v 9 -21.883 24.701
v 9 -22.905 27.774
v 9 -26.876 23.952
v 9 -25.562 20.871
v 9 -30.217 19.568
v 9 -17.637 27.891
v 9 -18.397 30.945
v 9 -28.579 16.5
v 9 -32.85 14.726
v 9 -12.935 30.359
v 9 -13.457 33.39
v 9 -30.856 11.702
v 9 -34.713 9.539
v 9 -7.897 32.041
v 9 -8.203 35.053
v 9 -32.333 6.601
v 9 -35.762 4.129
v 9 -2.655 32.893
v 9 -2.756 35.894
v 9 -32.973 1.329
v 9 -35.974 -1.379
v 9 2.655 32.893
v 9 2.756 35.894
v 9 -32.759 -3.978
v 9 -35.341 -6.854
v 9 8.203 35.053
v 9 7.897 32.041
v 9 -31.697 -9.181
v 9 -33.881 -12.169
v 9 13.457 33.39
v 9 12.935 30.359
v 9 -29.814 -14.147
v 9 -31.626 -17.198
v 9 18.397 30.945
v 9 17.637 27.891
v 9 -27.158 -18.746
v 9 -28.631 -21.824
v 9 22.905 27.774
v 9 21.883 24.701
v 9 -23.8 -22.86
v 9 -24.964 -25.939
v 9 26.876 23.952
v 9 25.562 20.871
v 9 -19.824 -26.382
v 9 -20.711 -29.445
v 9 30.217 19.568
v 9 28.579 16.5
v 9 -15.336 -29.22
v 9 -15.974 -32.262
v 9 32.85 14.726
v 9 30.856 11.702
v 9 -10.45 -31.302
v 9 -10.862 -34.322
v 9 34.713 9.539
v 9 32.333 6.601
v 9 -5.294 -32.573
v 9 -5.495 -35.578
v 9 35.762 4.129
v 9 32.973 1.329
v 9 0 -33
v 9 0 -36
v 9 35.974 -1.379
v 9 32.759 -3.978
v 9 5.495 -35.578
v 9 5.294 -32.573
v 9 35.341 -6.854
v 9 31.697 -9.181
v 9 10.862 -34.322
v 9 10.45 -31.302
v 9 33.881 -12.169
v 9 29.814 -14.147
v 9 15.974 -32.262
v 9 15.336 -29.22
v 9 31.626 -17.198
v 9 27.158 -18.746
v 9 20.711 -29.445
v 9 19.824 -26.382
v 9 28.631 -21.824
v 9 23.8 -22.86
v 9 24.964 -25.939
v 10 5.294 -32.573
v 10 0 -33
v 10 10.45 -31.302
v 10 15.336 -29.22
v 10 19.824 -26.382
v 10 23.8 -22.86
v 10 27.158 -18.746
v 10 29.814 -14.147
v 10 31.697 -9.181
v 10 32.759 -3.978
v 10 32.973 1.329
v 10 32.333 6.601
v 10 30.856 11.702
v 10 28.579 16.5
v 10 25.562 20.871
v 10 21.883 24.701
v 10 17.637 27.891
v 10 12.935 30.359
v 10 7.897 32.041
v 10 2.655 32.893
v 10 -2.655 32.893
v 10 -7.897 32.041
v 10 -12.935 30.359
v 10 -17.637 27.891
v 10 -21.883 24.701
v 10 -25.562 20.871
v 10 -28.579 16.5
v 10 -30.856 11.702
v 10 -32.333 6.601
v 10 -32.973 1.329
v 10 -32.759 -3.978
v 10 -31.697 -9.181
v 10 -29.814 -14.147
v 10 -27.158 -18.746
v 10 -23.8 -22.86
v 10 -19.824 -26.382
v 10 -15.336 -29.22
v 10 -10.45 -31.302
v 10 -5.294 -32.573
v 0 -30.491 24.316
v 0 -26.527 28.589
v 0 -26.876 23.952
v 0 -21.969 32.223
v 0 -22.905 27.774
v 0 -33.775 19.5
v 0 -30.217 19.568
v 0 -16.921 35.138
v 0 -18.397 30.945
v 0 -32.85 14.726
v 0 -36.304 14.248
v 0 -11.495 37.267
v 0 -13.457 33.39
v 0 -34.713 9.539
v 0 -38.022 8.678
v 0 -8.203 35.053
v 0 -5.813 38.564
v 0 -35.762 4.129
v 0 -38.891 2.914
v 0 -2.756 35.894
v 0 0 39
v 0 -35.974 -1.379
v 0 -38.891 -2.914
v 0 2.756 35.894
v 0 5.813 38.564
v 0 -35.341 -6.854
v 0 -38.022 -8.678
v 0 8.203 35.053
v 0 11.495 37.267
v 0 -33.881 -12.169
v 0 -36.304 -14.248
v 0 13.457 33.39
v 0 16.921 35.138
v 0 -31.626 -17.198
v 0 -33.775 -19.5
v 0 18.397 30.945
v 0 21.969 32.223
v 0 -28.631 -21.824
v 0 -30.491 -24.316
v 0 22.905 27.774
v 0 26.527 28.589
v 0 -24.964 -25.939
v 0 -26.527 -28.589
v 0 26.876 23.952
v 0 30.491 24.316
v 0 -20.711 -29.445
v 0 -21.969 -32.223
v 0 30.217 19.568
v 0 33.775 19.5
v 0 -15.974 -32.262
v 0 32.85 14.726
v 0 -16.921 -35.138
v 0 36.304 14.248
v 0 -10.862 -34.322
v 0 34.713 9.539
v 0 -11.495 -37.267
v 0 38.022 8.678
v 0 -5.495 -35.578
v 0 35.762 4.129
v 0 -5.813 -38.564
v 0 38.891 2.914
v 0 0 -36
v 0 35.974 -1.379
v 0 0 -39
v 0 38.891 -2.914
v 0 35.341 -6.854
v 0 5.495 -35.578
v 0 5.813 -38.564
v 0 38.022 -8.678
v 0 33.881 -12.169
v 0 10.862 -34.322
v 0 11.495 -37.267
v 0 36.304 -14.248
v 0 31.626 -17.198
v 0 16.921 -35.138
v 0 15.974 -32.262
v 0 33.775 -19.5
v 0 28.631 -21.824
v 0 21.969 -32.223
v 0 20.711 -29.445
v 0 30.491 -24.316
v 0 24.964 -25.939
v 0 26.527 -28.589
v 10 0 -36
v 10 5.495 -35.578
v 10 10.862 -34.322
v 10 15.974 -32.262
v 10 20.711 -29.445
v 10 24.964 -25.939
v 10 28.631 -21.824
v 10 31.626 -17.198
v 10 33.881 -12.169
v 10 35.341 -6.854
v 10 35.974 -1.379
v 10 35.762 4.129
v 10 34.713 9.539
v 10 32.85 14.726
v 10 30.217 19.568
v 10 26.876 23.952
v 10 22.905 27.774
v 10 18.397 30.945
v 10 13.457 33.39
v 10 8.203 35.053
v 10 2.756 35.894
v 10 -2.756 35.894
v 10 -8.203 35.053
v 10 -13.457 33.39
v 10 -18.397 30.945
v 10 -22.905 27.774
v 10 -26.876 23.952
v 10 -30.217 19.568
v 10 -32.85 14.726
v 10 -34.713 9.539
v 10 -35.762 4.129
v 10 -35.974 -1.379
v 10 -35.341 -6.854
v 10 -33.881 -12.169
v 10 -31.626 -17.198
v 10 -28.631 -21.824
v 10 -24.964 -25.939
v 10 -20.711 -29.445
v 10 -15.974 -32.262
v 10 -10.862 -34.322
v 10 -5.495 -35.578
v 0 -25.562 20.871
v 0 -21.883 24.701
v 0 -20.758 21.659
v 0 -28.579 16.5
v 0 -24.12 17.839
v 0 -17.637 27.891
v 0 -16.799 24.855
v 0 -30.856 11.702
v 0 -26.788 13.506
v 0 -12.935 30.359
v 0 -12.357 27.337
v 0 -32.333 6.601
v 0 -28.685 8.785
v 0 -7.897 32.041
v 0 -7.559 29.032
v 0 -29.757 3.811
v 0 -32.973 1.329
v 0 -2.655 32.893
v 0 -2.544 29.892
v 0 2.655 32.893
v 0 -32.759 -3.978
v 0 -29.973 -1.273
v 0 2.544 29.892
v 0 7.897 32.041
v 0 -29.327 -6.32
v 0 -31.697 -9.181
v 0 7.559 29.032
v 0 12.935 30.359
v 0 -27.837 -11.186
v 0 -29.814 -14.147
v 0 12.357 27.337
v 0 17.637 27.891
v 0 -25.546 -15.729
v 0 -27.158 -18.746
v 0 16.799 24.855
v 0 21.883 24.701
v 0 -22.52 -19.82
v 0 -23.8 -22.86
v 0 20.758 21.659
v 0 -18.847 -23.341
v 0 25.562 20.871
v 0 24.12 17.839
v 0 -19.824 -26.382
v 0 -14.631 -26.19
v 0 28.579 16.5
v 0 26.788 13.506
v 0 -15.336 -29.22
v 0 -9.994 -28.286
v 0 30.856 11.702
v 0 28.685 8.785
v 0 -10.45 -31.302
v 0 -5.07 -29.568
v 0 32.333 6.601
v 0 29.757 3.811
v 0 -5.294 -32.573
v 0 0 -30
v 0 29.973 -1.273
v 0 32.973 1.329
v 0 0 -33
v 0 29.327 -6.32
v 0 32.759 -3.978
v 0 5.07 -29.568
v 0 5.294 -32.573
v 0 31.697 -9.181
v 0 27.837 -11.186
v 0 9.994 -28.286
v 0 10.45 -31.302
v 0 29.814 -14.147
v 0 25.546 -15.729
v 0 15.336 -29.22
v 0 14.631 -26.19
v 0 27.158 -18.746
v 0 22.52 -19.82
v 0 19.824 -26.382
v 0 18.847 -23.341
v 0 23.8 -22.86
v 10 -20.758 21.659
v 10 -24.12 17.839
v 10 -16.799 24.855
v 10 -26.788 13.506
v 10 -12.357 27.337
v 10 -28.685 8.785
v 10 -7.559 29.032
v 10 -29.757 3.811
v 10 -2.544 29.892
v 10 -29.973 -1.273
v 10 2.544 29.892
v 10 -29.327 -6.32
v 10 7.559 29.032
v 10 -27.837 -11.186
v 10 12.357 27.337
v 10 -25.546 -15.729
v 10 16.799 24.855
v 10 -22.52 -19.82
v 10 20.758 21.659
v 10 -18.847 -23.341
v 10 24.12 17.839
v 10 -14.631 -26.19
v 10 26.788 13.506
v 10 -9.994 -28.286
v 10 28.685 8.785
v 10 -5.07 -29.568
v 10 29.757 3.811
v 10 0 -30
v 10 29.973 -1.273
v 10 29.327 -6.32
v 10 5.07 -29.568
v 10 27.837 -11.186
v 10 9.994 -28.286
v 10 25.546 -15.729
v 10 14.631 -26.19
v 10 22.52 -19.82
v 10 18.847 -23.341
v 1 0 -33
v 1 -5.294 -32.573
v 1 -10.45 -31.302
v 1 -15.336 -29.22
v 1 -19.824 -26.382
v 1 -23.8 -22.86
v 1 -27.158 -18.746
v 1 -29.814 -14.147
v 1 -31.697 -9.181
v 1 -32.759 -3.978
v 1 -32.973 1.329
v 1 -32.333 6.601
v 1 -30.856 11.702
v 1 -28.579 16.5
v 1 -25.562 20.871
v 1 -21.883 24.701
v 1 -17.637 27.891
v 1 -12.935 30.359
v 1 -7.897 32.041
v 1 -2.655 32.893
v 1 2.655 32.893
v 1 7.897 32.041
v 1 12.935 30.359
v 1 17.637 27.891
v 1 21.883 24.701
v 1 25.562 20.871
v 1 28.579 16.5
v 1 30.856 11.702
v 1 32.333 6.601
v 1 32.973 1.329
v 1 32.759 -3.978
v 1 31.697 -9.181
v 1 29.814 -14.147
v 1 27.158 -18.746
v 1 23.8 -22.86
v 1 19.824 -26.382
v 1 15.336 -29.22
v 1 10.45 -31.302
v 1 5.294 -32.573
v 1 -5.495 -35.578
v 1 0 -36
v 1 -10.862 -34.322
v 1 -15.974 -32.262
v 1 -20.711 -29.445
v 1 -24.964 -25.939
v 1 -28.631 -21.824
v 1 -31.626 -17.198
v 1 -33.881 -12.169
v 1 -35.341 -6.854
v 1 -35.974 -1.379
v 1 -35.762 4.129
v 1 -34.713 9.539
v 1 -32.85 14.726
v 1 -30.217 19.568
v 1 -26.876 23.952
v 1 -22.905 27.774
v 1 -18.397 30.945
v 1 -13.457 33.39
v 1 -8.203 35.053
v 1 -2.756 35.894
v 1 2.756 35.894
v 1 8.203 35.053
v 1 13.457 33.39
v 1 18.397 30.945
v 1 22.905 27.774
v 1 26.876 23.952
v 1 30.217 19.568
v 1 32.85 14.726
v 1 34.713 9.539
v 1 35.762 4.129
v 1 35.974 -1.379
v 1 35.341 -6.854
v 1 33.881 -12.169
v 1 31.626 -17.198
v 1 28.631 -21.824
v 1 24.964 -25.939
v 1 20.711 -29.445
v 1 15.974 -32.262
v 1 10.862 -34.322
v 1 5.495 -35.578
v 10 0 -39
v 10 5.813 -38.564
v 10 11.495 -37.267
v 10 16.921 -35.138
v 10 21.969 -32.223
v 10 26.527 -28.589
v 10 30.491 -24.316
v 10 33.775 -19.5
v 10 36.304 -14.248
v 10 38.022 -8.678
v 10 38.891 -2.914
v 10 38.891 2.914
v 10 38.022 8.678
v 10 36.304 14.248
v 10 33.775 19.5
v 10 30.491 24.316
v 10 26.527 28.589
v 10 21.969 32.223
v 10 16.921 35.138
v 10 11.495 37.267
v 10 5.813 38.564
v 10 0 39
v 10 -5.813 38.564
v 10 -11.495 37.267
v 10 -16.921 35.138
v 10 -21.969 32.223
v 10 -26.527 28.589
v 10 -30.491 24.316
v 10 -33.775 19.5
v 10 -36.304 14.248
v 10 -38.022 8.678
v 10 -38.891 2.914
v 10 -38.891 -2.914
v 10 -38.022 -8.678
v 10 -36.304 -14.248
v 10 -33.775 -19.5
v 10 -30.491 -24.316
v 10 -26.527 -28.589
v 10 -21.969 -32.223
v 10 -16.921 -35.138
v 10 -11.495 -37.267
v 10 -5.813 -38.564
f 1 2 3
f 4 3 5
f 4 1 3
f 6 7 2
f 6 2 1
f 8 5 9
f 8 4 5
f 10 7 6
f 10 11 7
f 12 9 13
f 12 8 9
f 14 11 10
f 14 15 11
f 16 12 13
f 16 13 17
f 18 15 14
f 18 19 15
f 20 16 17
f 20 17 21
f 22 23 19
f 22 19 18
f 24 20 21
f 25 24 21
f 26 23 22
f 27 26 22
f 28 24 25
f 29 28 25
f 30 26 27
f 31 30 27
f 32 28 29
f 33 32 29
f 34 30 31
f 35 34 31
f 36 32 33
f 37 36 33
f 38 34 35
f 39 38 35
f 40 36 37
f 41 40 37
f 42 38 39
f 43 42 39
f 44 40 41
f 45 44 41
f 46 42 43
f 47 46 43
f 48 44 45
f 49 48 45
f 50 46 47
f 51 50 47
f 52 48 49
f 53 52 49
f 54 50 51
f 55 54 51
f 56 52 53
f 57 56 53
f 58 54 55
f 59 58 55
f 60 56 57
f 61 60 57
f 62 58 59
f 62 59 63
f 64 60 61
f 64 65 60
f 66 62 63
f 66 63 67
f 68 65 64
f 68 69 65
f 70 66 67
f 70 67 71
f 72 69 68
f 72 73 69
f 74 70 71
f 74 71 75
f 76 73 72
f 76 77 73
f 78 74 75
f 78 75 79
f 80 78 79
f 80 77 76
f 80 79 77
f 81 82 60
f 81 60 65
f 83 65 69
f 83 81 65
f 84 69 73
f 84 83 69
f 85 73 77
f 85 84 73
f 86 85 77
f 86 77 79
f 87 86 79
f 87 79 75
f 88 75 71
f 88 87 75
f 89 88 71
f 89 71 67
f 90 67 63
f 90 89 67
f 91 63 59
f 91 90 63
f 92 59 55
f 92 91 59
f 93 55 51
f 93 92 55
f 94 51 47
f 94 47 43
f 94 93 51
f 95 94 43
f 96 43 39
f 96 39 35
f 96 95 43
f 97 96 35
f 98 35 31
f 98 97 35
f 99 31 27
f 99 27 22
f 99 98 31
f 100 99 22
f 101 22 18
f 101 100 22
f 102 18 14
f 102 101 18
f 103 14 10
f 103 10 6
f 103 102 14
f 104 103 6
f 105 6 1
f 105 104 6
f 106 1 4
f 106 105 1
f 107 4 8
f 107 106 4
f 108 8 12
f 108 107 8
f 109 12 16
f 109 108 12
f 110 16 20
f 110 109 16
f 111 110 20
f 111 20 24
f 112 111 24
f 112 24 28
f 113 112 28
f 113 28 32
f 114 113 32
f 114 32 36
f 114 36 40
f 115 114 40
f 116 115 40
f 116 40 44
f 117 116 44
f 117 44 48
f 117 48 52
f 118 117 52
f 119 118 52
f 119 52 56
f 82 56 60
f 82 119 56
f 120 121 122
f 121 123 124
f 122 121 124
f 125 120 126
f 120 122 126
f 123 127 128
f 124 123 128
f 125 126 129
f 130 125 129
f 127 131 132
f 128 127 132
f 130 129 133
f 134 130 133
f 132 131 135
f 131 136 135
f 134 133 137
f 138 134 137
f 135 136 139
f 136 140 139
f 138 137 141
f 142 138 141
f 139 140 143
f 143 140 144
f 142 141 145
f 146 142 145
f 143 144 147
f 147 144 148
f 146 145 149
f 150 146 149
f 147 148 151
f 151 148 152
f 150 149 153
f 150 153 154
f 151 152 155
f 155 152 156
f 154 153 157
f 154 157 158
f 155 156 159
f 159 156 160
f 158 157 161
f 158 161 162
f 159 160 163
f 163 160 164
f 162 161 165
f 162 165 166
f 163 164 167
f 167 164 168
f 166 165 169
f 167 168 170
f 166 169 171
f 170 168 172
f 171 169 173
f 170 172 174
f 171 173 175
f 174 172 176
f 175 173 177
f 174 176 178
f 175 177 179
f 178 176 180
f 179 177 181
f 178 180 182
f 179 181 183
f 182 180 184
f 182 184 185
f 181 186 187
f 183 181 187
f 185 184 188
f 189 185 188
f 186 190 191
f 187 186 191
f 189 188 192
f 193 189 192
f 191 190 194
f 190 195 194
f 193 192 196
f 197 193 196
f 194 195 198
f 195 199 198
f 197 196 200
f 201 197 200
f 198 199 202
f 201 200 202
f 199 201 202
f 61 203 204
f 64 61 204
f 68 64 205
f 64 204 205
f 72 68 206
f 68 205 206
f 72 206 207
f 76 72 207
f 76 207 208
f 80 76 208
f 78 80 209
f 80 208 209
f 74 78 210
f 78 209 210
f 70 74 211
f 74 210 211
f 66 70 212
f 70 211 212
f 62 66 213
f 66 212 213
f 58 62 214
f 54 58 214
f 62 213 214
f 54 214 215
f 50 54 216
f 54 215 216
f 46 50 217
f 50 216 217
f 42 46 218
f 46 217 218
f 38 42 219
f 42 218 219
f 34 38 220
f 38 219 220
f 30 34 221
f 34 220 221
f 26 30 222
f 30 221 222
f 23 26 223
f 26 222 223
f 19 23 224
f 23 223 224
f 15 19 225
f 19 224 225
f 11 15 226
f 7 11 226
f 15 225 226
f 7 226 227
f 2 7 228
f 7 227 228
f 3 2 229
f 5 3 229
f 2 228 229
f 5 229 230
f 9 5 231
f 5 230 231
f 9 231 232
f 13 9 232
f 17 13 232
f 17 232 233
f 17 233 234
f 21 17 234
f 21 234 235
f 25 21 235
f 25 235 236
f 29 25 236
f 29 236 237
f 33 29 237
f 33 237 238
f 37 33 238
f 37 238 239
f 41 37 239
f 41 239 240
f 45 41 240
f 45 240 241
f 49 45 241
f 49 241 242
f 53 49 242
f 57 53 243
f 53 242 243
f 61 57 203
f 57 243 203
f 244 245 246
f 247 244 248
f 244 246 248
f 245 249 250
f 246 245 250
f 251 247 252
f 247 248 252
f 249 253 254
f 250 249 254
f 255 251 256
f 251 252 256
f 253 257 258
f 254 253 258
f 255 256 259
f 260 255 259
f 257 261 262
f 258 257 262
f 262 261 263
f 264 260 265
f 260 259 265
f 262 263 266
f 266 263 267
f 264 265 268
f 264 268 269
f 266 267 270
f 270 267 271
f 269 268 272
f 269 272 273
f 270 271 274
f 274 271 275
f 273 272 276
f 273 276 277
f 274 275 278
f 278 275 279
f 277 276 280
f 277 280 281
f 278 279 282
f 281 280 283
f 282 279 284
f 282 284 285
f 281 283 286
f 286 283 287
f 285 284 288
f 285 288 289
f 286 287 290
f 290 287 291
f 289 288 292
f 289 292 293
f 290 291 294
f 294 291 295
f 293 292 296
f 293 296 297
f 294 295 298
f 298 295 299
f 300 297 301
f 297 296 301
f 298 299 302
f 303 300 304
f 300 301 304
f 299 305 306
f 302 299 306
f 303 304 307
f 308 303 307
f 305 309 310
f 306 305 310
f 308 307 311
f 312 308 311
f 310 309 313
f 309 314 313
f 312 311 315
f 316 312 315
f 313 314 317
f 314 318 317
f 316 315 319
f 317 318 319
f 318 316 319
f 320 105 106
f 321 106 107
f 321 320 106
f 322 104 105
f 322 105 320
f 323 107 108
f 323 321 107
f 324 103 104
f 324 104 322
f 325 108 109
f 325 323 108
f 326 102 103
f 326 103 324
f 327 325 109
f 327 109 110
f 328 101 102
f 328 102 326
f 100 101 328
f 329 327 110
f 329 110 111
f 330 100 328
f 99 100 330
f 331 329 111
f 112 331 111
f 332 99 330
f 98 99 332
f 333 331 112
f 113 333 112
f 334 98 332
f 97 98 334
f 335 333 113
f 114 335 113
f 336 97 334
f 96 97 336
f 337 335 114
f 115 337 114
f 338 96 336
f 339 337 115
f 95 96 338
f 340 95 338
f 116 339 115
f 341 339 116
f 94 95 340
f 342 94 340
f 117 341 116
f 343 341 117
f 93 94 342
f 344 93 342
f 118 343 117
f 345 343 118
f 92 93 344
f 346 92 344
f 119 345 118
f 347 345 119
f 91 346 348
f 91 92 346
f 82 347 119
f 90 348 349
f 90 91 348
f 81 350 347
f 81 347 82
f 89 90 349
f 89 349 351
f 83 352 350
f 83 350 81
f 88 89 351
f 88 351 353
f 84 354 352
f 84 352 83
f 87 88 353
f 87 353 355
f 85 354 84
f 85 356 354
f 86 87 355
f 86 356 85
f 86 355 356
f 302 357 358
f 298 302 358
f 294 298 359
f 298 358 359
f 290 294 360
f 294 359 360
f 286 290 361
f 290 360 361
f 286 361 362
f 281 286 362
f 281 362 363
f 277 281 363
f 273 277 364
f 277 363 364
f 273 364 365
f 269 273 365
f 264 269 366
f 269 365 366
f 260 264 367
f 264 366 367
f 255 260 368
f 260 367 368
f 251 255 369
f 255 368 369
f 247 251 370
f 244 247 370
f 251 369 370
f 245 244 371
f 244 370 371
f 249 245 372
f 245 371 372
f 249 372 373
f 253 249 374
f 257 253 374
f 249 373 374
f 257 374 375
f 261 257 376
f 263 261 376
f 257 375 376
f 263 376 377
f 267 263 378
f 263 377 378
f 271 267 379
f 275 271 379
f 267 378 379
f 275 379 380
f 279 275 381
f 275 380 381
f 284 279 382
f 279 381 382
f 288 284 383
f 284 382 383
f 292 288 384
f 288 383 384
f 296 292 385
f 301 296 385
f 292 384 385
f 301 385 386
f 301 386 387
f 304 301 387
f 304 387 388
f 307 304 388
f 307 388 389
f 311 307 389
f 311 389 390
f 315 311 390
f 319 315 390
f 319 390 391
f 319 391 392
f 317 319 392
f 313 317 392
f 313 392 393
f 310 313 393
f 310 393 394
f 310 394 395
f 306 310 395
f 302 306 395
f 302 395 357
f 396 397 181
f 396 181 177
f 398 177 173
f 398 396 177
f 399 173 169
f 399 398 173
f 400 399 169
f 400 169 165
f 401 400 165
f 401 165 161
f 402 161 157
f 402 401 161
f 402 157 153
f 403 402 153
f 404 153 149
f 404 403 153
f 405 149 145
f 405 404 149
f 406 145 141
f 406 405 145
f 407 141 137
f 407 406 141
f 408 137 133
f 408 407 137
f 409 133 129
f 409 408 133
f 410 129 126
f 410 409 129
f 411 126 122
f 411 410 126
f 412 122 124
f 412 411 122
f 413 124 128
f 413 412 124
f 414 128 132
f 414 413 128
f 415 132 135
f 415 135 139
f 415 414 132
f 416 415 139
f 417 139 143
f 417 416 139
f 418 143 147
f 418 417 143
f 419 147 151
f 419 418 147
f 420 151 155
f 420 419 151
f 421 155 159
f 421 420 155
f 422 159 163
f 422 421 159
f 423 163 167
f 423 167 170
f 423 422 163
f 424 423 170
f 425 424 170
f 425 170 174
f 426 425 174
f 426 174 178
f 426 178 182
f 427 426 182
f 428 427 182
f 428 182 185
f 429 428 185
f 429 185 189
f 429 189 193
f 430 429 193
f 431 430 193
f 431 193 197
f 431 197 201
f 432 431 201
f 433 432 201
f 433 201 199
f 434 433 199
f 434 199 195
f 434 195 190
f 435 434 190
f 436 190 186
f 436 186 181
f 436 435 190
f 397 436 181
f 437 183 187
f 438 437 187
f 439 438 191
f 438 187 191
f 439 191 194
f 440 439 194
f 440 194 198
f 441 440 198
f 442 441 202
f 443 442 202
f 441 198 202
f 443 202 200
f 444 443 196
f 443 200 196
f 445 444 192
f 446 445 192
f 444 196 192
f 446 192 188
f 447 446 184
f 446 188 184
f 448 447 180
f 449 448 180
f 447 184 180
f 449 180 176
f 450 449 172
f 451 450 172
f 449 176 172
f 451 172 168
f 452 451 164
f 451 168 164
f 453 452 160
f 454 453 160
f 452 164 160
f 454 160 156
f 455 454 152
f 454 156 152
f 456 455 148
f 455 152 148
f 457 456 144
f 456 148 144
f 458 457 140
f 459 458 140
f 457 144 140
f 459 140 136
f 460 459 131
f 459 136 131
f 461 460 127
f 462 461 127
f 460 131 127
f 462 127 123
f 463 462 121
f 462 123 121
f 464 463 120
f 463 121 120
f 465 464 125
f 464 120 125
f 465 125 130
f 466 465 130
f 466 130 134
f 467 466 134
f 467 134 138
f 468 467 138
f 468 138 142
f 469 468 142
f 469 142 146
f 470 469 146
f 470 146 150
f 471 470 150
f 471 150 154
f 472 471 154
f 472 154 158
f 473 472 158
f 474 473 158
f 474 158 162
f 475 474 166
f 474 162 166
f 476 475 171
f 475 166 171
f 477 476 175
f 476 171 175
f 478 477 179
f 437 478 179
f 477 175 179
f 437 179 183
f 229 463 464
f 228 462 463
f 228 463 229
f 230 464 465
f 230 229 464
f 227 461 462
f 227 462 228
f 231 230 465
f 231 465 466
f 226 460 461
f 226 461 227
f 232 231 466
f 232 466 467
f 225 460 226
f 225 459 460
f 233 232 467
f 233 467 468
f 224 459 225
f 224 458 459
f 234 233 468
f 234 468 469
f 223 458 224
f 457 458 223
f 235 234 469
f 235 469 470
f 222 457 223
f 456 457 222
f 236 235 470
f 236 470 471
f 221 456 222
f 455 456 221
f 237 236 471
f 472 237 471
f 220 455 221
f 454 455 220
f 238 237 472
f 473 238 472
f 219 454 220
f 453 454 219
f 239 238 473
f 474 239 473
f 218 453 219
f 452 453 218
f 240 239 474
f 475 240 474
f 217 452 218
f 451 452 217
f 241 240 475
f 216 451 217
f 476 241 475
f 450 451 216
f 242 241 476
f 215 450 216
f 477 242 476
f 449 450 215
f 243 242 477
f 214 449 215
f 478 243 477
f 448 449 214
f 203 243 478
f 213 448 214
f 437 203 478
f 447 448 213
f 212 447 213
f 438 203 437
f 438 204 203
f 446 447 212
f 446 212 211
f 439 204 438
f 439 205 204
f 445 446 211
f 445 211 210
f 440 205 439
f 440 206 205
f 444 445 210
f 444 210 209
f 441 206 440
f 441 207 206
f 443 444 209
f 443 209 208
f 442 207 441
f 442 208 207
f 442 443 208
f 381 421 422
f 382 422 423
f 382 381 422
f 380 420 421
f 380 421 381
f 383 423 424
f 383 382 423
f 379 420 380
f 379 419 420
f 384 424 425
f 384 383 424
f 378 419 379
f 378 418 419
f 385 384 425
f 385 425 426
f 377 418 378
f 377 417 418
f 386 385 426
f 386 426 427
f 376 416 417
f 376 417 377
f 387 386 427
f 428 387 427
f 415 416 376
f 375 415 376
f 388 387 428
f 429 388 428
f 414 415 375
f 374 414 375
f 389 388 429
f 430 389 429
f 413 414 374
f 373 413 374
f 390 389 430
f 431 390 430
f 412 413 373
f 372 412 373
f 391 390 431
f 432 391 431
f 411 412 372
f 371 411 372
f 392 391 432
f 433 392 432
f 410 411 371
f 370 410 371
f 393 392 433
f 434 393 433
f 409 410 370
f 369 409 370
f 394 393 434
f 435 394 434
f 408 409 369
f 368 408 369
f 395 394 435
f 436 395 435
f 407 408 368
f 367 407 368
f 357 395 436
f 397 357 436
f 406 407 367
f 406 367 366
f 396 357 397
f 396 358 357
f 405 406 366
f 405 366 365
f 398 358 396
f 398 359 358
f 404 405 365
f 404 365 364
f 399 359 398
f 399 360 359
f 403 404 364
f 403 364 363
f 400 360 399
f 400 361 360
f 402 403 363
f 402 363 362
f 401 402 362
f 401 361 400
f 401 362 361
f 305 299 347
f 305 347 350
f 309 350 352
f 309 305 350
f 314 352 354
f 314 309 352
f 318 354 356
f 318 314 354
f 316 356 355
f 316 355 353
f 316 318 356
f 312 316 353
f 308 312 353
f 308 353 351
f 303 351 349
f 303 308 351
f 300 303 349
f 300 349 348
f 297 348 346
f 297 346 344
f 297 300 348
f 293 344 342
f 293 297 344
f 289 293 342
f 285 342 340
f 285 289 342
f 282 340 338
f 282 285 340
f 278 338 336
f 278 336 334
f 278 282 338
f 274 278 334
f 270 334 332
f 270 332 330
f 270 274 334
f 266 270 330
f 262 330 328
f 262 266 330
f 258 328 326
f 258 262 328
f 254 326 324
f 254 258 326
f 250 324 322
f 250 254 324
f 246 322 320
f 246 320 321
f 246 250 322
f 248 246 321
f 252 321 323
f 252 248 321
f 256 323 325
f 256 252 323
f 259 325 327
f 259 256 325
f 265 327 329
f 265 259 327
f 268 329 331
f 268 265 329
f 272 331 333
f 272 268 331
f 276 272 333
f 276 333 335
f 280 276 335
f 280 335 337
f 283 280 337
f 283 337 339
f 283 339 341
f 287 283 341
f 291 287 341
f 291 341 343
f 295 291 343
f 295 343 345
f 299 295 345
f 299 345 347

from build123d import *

# Parameters (mm, degrees)
SKETCH_1_R          = 39
SKETCH_1_R_2        = 30
EXTRUDE_1_DEPTH     = 10
SKETCH_2_R          = 36
SKETCH_2_R_2        = 33
CUT_EXTRUDE_1_DEPTH = 1
CUT_EXTRUDE_START   = -1
SKETCH_3_R          = 36
SKETCH_3_R_2        = 33
CUT_EXTRUDE_2_DEPTH = 1


with BuildPart() as part:
    # 草图1 → 凸台-拉伸1 (new body)
    with BuildSketch(Plane(origin=(0, 0, 0), x_dir=(0, 0, -1), z_dir=(1, 0, 0))):
        Circle(SKETCH_1_R)
        Circle(SKETCH_1_R_2, mode=Mode.SUBTRACT)
    extrude(amount=EXTRUDE_1_DEPTH)

    # 草图2 → 切除-拉伸1 (cut)
    with BuildSketch(Plane(origin=(10, 0, 0), x_dir=(0, 0, -1), z_dir=(1, 0, 0))):
        Circle(SKETCH_2_R)
        Circle(SKETCH_2_R_2, mode=Mode.SUBTRACT)
    extrude(amount=-CUT_EXTRUDE_1_DEPTH, mode=Mode.SUBTRACT)

    # 草图3 → 切除-拉伸2 (cut)
    with BuildSketch(Plane.ZY.offset(CUT_EXTRUDE_START)):
        with Locations(Location((0, 0, 0), (0, 0, 180))):
            Circle(SKETCH_3_R)
        with Locations(Location((0, 0, 0), (0, 0, 180))):
            Circle(SKETCH_3_R_2, mode=Mode.SUBTRACT)
    extrude(amount=CUT_EXTRUDE_2_DEPTH, mode=Mode.SUBTRACT)


solid = part.part
